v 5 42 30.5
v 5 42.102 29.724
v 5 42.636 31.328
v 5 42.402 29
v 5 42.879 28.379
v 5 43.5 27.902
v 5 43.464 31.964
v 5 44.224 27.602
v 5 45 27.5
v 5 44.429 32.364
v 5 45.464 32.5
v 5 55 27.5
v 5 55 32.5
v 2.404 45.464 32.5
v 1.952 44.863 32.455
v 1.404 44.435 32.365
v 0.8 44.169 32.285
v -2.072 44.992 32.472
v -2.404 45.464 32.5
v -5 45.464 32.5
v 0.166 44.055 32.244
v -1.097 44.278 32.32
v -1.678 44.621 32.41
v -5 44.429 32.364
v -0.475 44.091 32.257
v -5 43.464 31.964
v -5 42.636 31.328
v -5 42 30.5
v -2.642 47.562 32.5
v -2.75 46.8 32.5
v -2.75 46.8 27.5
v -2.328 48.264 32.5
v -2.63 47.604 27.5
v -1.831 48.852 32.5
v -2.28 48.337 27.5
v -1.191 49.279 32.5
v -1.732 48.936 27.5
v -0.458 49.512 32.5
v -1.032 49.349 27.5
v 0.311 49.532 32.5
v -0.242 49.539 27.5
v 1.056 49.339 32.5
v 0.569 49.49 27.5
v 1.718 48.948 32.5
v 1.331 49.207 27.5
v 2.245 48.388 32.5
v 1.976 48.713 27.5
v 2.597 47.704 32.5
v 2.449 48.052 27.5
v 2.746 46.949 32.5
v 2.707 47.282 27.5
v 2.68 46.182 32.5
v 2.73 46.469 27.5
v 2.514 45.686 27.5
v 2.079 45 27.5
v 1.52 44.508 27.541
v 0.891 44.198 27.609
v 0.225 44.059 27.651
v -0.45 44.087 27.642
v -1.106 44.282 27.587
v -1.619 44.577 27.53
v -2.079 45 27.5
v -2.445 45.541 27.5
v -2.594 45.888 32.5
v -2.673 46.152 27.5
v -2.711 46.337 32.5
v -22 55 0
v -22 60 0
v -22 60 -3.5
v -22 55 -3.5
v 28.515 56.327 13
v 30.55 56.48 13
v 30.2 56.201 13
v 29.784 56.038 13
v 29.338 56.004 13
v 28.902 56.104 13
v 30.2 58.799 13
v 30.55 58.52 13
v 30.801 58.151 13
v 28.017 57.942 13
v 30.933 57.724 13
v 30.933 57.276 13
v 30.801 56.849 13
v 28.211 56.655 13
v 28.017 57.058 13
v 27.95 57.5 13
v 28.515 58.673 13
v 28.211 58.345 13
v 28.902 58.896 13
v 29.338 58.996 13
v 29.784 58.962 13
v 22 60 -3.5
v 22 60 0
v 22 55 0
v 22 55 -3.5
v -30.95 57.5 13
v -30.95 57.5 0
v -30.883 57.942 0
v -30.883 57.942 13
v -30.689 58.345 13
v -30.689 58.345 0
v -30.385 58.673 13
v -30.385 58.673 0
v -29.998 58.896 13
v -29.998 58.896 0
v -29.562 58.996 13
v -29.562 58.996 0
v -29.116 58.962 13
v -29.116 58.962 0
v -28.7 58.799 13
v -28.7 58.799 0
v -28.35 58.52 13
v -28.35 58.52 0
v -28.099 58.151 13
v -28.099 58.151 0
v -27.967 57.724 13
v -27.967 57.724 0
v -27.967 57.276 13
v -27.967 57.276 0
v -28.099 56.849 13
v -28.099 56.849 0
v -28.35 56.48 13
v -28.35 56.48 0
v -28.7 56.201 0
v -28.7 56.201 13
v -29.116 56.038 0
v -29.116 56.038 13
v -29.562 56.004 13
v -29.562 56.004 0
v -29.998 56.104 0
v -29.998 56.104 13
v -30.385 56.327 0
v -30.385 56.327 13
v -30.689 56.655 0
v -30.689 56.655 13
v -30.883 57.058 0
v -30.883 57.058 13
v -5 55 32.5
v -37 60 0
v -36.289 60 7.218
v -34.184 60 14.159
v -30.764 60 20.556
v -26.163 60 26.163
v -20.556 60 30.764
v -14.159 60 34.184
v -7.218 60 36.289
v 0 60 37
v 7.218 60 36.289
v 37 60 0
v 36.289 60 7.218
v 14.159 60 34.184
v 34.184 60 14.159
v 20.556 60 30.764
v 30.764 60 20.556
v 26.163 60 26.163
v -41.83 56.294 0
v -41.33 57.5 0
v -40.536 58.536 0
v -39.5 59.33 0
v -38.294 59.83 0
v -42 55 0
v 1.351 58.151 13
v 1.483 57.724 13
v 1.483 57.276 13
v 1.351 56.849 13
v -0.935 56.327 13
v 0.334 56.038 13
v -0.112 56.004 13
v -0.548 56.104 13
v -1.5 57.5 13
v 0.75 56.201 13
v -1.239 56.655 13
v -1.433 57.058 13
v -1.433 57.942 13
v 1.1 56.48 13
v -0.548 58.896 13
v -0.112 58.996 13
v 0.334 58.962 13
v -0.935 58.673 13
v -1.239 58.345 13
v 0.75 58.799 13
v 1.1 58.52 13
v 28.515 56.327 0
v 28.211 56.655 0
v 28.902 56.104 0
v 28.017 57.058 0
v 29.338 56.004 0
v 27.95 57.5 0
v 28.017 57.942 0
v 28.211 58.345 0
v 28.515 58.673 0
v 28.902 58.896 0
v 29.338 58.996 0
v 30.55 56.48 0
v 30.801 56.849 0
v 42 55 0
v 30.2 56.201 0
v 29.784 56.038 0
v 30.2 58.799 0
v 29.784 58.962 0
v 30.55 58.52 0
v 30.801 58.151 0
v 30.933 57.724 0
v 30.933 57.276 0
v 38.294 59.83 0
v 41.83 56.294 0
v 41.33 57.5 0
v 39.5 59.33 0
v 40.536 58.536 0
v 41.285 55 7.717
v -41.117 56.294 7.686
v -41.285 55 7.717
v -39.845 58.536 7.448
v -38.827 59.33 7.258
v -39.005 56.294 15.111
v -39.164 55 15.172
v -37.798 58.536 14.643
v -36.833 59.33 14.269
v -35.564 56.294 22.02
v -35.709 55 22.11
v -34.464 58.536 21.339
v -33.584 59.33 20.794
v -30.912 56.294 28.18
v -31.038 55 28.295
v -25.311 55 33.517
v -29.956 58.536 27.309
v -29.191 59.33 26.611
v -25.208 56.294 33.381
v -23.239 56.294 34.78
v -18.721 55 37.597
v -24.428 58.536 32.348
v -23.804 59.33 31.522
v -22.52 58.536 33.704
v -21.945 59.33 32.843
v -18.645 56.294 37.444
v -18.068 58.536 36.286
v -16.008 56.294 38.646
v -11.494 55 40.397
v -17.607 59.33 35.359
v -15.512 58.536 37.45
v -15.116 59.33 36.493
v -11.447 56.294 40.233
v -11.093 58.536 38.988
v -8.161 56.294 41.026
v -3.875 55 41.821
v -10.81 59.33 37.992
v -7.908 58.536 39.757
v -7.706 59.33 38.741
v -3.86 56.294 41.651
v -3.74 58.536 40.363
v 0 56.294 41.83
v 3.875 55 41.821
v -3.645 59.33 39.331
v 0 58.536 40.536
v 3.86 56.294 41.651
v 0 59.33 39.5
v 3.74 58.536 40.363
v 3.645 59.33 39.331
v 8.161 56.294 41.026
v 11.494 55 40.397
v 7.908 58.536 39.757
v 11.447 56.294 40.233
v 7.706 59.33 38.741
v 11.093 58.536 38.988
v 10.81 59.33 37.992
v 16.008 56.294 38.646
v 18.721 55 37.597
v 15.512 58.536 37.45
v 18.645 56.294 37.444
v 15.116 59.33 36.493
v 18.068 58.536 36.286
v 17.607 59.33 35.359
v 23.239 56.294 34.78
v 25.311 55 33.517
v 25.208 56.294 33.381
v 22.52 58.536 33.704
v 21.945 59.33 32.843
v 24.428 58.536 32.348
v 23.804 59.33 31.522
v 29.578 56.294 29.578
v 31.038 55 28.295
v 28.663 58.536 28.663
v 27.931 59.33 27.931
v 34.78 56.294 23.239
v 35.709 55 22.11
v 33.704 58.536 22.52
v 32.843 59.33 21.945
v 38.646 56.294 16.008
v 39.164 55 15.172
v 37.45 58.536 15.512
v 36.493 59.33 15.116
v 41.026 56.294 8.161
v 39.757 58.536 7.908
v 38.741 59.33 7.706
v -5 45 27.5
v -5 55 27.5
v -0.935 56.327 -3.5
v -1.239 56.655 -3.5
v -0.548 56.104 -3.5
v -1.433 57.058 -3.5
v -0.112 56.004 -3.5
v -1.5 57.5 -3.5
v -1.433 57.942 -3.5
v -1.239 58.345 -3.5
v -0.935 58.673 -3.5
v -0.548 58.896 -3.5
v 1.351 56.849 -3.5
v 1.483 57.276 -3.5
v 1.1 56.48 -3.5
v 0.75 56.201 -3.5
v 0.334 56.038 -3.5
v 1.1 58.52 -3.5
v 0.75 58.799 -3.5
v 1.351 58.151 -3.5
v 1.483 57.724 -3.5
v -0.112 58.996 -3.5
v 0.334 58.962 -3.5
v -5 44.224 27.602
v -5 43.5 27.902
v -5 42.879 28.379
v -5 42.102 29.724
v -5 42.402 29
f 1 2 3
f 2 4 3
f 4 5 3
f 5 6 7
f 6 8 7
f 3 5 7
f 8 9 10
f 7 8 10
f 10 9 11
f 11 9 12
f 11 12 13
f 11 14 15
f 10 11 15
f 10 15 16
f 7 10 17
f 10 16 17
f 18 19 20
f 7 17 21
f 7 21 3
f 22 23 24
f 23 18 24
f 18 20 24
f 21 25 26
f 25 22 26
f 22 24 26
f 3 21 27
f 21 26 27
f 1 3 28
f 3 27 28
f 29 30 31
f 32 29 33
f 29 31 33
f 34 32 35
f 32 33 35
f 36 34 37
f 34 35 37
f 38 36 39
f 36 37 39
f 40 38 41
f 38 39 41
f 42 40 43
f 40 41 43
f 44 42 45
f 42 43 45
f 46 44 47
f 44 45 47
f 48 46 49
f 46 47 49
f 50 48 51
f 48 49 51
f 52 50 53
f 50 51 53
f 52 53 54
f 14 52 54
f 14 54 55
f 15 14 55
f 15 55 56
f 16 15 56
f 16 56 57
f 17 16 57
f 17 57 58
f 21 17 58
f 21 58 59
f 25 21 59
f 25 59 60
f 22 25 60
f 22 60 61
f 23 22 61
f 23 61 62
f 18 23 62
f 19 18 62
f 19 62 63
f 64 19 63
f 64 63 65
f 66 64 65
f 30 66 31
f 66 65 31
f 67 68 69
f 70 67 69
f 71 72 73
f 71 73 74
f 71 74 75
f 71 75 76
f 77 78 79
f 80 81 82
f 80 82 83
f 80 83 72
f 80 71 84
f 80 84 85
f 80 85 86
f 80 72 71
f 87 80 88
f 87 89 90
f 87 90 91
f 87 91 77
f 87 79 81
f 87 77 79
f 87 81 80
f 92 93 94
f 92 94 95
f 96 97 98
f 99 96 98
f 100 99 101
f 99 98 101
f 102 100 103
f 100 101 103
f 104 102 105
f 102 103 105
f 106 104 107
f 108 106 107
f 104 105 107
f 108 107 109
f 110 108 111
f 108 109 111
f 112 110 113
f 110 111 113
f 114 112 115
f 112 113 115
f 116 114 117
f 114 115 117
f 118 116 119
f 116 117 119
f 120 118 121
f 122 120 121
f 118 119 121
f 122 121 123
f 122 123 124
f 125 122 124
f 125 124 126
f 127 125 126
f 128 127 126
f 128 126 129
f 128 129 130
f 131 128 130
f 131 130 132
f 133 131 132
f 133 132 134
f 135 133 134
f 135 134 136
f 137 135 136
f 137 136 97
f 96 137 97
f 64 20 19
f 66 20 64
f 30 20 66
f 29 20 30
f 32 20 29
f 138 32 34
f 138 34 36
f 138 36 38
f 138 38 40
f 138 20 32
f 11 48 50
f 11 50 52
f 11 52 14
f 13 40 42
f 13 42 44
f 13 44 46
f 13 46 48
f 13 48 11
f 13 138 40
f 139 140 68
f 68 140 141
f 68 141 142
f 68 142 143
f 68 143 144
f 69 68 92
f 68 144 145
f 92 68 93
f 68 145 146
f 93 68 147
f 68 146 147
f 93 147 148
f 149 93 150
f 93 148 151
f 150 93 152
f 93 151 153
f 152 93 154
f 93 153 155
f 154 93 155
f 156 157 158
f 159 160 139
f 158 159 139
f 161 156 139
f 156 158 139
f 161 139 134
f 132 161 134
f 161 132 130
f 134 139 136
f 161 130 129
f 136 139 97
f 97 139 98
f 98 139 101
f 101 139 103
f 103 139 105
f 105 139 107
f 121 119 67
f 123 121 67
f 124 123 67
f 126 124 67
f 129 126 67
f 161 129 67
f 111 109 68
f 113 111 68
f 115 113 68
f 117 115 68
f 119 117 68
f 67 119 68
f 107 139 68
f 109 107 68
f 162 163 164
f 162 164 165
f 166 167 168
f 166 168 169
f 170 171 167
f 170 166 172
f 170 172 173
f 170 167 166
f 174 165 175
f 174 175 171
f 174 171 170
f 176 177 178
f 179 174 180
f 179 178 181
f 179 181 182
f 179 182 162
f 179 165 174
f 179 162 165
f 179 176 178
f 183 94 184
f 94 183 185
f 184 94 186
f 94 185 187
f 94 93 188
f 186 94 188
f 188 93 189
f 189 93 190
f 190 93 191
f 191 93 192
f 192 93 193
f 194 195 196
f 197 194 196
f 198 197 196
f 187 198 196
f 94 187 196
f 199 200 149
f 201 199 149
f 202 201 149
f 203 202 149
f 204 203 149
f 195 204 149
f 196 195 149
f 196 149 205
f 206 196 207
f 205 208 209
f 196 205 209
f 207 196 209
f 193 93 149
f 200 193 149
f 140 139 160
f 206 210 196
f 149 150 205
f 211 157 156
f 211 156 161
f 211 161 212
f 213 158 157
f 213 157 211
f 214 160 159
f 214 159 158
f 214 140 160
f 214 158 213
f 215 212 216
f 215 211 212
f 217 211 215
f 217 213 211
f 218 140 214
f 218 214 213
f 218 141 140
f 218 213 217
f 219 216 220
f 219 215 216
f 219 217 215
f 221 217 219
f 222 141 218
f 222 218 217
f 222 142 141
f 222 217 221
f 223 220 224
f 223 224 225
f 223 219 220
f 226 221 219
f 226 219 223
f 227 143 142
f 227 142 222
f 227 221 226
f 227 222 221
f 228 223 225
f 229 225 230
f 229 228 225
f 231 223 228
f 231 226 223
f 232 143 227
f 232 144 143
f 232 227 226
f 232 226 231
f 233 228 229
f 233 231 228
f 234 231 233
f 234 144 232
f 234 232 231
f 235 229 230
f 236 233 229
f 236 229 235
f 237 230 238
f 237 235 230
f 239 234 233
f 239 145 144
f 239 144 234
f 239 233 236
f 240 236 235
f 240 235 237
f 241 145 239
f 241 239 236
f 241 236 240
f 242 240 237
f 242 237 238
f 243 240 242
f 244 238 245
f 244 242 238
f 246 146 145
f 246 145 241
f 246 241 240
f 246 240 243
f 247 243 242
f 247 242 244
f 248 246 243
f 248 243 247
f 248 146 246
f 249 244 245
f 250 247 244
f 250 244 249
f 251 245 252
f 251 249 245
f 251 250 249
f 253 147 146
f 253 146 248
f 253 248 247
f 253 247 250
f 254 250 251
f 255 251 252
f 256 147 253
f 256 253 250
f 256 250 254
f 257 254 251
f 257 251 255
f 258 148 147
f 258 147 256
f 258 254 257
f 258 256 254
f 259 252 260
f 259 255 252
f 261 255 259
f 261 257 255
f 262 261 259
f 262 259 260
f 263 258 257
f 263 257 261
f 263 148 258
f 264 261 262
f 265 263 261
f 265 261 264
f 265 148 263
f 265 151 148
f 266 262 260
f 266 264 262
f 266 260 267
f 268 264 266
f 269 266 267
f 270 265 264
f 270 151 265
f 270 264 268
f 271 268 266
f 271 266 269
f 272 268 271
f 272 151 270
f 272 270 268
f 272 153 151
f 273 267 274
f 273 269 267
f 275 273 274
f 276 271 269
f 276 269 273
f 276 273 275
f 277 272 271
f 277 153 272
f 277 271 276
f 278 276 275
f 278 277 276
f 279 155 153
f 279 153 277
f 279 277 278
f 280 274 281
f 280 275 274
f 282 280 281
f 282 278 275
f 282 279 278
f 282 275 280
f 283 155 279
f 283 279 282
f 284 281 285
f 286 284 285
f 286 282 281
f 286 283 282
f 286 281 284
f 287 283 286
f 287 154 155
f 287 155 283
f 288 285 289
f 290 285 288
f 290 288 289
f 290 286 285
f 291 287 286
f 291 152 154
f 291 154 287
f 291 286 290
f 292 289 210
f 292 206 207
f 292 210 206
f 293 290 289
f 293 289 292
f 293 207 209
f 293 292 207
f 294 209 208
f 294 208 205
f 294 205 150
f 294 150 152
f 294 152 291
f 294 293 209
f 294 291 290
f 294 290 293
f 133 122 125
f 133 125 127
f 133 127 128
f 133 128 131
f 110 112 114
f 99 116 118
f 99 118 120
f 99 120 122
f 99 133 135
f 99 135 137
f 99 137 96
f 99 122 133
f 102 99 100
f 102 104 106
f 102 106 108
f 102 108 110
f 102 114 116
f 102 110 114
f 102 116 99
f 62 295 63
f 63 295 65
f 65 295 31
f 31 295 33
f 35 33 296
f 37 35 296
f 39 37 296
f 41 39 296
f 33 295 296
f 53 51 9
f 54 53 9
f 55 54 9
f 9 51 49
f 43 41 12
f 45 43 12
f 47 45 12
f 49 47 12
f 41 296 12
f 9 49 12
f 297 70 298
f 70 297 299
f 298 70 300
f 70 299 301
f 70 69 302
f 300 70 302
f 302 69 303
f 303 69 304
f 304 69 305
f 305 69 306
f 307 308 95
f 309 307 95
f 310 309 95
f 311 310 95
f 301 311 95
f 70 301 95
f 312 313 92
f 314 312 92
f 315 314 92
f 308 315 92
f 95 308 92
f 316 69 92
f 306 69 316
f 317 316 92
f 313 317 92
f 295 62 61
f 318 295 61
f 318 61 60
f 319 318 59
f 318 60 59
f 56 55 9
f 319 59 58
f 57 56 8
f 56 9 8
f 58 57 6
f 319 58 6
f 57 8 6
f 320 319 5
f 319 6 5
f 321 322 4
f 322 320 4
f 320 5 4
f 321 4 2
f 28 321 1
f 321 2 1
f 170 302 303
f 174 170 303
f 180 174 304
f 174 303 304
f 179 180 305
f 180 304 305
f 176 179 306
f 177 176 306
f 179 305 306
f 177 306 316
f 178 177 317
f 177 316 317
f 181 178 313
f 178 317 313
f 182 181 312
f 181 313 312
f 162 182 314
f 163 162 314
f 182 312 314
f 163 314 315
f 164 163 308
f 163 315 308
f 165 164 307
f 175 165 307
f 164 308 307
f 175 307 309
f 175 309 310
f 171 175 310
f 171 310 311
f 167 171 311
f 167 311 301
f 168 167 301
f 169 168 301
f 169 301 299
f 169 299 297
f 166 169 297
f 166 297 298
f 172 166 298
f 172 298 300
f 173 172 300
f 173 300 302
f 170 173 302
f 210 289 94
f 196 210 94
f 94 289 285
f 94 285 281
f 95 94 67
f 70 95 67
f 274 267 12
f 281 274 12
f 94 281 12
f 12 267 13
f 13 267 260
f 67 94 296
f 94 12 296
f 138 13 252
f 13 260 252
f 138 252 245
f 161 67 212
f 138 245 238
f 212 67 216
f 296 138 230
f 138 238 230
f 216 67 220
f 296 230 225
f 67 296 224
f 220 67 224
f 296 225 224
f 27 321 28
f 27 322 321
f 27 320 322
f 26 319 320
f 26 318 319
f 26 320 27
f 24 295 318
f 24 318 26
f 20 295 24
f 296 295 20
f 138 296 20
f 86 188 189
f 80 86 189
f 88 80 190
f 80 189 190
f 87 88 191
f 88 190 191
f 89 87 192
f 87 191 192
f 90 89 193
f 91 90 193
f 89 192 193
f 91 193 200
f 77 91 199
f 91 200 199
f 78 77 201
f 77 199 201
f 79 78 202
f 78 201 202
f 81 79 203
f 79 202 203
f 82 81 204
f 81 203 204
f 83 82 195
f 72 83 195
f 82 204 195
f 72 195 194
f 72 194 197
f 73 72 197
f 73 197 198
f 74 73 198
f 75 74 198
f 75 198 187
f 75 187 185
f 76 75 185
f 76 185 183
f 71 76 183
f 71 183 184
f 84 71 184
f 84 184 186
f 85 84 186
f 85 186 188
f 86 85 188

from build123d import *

# Parameters (mm, degrees)
CUT_EXTRUDE1_DEPTH   = 5
CUT_EXTRUDE3_DEPTH   = 45
SKETCH8_R            = 40
CUT_EXTRUDE4_DEPTH   = 32
SKETCH9_R            = 32
SKETCH9_R_2          = 24.5
CUT_EXTRUDE5_DEPTH   = 14
SKETCH10_R           = 26
CUT_EXTRUDE6_DEPTH   = 14
FILLET1_R            = 7
FILLET2_R            = 7
CUT_REVOLVE1_START   = 22
CUT_REVOLVE1_DEPTH   = 30.5
CUT_EXTRUDE12_DEPTH  = 5
SKETCH18_W           = 13
SKETCH18_H           = 8
CUT_EXTRUDE13_DEPTH  = 5
INTERSECT1_OUTLINE_R = 42
INTERSECT1_DEPTH     = 55
SKETCH20_W           = 10
SKETCH20_H           = 5
BOSS_EXTRUDE1_DEPTH  = 13
BOSS_EXTRUDE3_DEPTH  = 7
SKETCH19_R           = 1.5
CUT_EXTRUDE14_DEPTH  = 20
SKETCH23_W           = 20
SKETCH23_H           = 7
CUT_EXTRUDE15_DEPTH  = 7
SKETCH24_W           = 44
SKETCH24_H           = 3.5
CUT_EXTRUDE16_DEPTH  = 5
SKETCH25_R           = 2.75
CUT_EXTRUDE17_DEPTH  = 5
FILLET4_R            = 3
FILLET6_R            = 4


with BuildPart() as part:
    # Sketch1 → Revolve1 (revolve)
    with BuildSketch(Plane.XY, mode=Mode.PRIVATE) as revolve1_sk:
        with BuildLine():
            Line((22.5, 0), (32, 0))
            ThreePointArc((32, 0), (33.414213562, 0.585786438), (34, 2))
            Line((34, 2), (34, 18))
            Line((34, 18), (40, 18))
            ThreePointArc((40, 18), (41.414213562, 18.585786438), (42, 20))
            Line((42, 20), (42, 55))
            ThreePointArc((42, 55), (40.535533906, 58.535533906), (37, 60))
            Line((37, 60), (0, 60))
            Line((0, 60), (0, 18))
            Line((0, 18), (22.5, 18))
            Line((22.5, 18), (22.5, 0))
        make_face()
    revolve(revolve1_sk.sketch.rotate(Axis((0, 2, 0), (0, 1, 0)), 90), axis=Axis((0, 2, 0), (0, 1, 0)))

    # Sketch5 → Cut-Extrude1 (cut)
    with BuildSketch(Plane(origin=(0, 60, 0), x_dir=(1, 0, 0), z_dir=(0, 1, 0))):
        with BuildLine():
            Line((-42, 0), (-40, 0))
            Line((-40, 0), (40, 0))
            Line((40, 0), (42, 0))
            ThreePointArc((42, 0), (0, 42), (-42, 0))
        make_face()
    extrude(amount=-CUT_EXTRUDE1_DEPTH, mode=Mode.SUBTRACT)

    # Sketch7 → Cut-Extrude3 (cut)
    with BuildSketch(Plane.XZ.offset(-18)):
        with BuildLine():
            Line((-21, 0), (21, 0))
            ThreePointArc((21, 0), (0, -21), (-21, 0))
        make_face()
    extrude(amount=-CUT_EXTRUDE3_DEPTH, mode=Mode.SUBTRACT)

    # Sketch8 → Cut-Extrude4 (cut)
    with BuildSketch(Plane(origin=(0, 52.5, 0), x_dir=(1, 0, 0), z_dir=(0, 1, 0))):
        with Locations(Location((0, 0, 0), (0, 0, 270))):
            Circle(SKETCH8_R)
        with BuildLine():
            Line((22.912878475, -2), (-22.912878475, -2))
            ThreePointArc((-22.912878475, -2), (0, 23), (22.912878475, -2))
        make_face(mode=Mode.SUBTRACT)
    extrude(amount=-CUT_EXTRUDE4_DEPTH, mode=Mode.SUBTRACT)

    # Sketch9 → Cut-Extrude5 (cut)
    with BuildSketch(Plane(origin=(0, 2, 0), x_dir=(-1, 0, 0), z_dir=(0, -1, 0))):
        with Locations(Location((0, 0, 0), (0, 0, 90))):
            Circle(SKETCH9_R)
        with Locations(Location((0, 0, 0), (0, 0, 90))):
            Circle(SKETCH9_R_2, mode=Mode.SUBTRACT)
    extrude(amount=-CUT_EXTRUDE5_DEPTH, mode=Mode.SUBTRACT)

    # Sketch10 → Cut-Extrude6 (cut)
    with BuildSketch(Plane(origin=(0, 2, 0), x_dir=(-1, 0, 0), z_dir=(0, -1, 0))):
        Circle(SKETCH10_R)
    extrude(amount=-CUT_EXTRUDE6_DEPTH, mode=Mode.SUBTRACT)

    # Fillet1
    fillet1_edges = [part.edges().sort_by_distance(p)[0] for p in [
        (21, 36.5, 0),
        (-21, 36.5, 0),
    ]]
    fillet(fillet1_edges, radius=FILLET1_R)

    # Fillet2
    fillet2_edges = [part.edges().sort_by_distance(p)[0] for p in [
        (-22.912878475, 36.5, 2),
        (22.912878475, 36.5, 2),
    ]]
    fillet(fillet2_edges, radius=FILLET2_R)

    # Cut-Revolve1: read off the stored shape, not the designer's step
    # Cut-Revolve1 outline → Cut-Revolve1 (cut)
    with BuildSketch(Plane(origin=(0, 0, 0), x_dir=(1, 0, 0), z_dir=(0, 1, 0)).offset(CUT_REVOLVE1_START)):
        with BuildLine():
            Line((-34.641016151, -20), (-36.373066959, -21))
            ThreePointArc((-36.373066959, -21), (0, -42), (36.373066959, -21))
            Line((36.373066959, -21), (34.641016151, -20))
            ThreePointArc((34.641016151, -20), (0, -40), (-34.641016151, -20))
        make_face()
    extrude(amount=CUT_REVOLVE1_DEPTH, mode=Mode.SUBTRACT)

    # Sketch15 → Cut-Extrude12 (cut)
    with BuildSketch(Plane(origin=(0, 20.5, 0), x_dir=(1, 0, 0), z_dir=(0, 1, 0))):
        with BuildLine():
            Line((-28.124355653, -3.514579578), (-26.124355653, -3.514579578))
            ThreePointArc((-26.124355653, -3.514579578), (-24.710142091, -2.928793141), (-24.124355653, -1.514579578))
            Line((-24.124355653, -1.514579578), (-24.124355653, 8.485420422))
            ThreePointArc((-24.124355653, 8.485420422), (-24.710142091, 9.899633984), (-26.124355653, 10.485420422))
            Line((-26.124355653, 10.485420422), (-28.124355653, 10.485420422))
            ThreePointArc((-28.124355653, 10.485420422), (-29.538569215, 9.899633984), (-30.124355653, 8.485420422))
            Line((-30.124355653, 8.485420422), (-30.124355653, -1.514579578))
            ThreePointArc((-30.124355653, -1.514579578), (-29.538569215, -2.928793141), (-28.124355653, -3.514579578))
        make_face()
    extrude(amount=-CUT_EXTRUDE12_DEPTH, mode=Mode.SUBTRACT)

    # Sketch18 → Cut-Extrude13 (cut)
    with BuildSketch(Plane(origin=(0, 55, 0), x_dir=(1, 0, 0), z_dir=(0, 1, 0))):
        with Locations((0.796512215, 32.951769165)):
            Rectangle(SKETCH18_W, SKETCH18_H)
    extrude(amount=-CUT_EXTRUDE13_DEPTH, mode=Mode.SUBTRACT)

    # Intersect1: read off the stored shape, not the designer's step
    # Intersect1 outline → Intersect1 (cut)
    with BuildSketch(Plane(origin=(0, 0, 0), x_dir=(1, 0, 0), z_dir=(0, 1, 0))):
        Circle(INTERSECT1_OUTLINE_R)
        with BuildLine():
            Line((12.124355653, 0), (-12.124355653, 0))
            ThreePointArc((-12.124355653, 0), (-18.186533479, 3.5), (-18.186533479, 10.5))
            ThreePointArc((-18.186533479, 10.5), (0, 21), (18.186533479, 10.5))
            ThreePointArc((18.186533479, 10.5), (18.186533479, 3.5), (12.124355653, 0))
        make_face(mode=Mode.SUBTRACT)
    extrude(amount=INTERSECT1_DEPTH, mode=Mode.SUBTRACT)

    # Sketch20 → Boss-Extrude1 (add)
    with BuildSketch(Plane.XZ.offset(-55)):
        with Locations((0, 30)):
            Rectangle(SKETCH20_W, SKETCH20_H)
    extrude(amount=BOSS_EXTRUDE1_DEPTH)

    # Sketch22 → Boss-Extrude3 (add)
    with BuildSketch(Plane(origin=(0, 0, 0), x_dir=(-1, 0, 0), z_dir=(0, 0, -1))):
        with BuildLine():
            Line((-42, 55), (42, 55))
            ThreePointArc((42, 55), (40.535533906, 58.535533906), (37, 60))
            Line((37, 60), (-37, 60))
            ThreePointArc((-37, 60), (-40.535533906, 58.535533906), (-42, 55))
        make_face()
    extrude(amount=BOSS_EXTRUDE3_DEPTH)

    # Sketch19 → Cut-Extrude14 (cut)
    with BuildSketch(Plane(origin=(0, 0, -7), x_dir=(-1, 0, 0), z_dir=(0, 0, -1))):
        with Locations((0, 57.5)):
            Circle(SKETCH19_R)
        with Locations((-29.45, 57.5)):
            Circle(SKETCH19_R)
        with Locations((29.45, 57.5)):
            Circle(SKETCH19_R)
    extrude(amount=-CUT_EXTRUDE14_DEPTH, mode=Mode.SUBTRACT)

    # Sketch23 → Cut-Extrude15 (cut)
    with BuildSketch(Plane(origin=(0, 60, 0), x_dir=(1, 0, 0), z_dir=(0, 1, 0))):
        with Locations((-32, 3.5)):
            Rectangle(SKETCH23_W, SKETCH23_H)
        with Locations((32, 3.5)):
            Rectangle(SKETCH23_W, SKETCH23_H)
    extrude(amount=-CUT_EXTRUDE15_DEPTH, mode=Mode.SUBTRACT)

    # Sketch24 → Cut-Extrude16 (cut)
    with BuildSketch(Plane(origin=(0, 60, 0), x_dir=(1, 0, 0), z_dir=(0, 1, 0))):
        with Locations((0, 5.25)):
            Rectangle(SKETCH24_W, SKETCH24_H)
    extrude(amount=-CUT_EXTRUDE16_DEPTH, mode=Mode.SUBTRACT)

    # Sketch25 → Cut-Extrude17 (cut)
    with BuildSketch(Plane(origin=(0, 0, 27.5), x_dir=(-1, 0, 0), z_dir=(0, 0, -1))):
        with Locations((0, 46.8)):
            Circle(SKETCH25_R)
    extrude(amount=-CUT_EXTRUDE17_DEPTH, mode=Mode.SUBTRACT)

    # Fillet4
    # the kernel refuses this fillet: 3 mm, written as the material it takes off along each edge
    with BuildSketch(Plane(origin=(12.5, 42, 27.5), x_dir=(0, 1, 0), z_dir=(-1, 0, 0))) as fillet4_piece_1:
        with BuildLine():
            CenterArc((FILLET4_R, -FILLET4_R), FILLET4_R, 90, 90)
            Line((0, -FILLET4_R), (0, 0))
            Line((0, 0), (FILLET4_R, 0))
        make_face()
    extrude(amount=25, mode=Mode.SUBTRACT)

    # Fillet6
    # the kernel refuses this fillet: 4 mm, written as the material it takes off along each edge
    with BuildSketch(Plane(origin=(-13.660254038, 42, 32.5), x_dir=(0, 1, 0), z_dir=(1, 0, 0))) as fillet6_piece_1:
        with BuildLine():
            CenterArc((3.464101615, -4), FILLET6_R, 90, 60)
            Line((0, -2), (0, 0))
            Line((0, 0), (3.464101615, 0))
        make_face()
    extrude(amount=27.320508076, mode=Mode.SUBTRACT)


solid = part.part
